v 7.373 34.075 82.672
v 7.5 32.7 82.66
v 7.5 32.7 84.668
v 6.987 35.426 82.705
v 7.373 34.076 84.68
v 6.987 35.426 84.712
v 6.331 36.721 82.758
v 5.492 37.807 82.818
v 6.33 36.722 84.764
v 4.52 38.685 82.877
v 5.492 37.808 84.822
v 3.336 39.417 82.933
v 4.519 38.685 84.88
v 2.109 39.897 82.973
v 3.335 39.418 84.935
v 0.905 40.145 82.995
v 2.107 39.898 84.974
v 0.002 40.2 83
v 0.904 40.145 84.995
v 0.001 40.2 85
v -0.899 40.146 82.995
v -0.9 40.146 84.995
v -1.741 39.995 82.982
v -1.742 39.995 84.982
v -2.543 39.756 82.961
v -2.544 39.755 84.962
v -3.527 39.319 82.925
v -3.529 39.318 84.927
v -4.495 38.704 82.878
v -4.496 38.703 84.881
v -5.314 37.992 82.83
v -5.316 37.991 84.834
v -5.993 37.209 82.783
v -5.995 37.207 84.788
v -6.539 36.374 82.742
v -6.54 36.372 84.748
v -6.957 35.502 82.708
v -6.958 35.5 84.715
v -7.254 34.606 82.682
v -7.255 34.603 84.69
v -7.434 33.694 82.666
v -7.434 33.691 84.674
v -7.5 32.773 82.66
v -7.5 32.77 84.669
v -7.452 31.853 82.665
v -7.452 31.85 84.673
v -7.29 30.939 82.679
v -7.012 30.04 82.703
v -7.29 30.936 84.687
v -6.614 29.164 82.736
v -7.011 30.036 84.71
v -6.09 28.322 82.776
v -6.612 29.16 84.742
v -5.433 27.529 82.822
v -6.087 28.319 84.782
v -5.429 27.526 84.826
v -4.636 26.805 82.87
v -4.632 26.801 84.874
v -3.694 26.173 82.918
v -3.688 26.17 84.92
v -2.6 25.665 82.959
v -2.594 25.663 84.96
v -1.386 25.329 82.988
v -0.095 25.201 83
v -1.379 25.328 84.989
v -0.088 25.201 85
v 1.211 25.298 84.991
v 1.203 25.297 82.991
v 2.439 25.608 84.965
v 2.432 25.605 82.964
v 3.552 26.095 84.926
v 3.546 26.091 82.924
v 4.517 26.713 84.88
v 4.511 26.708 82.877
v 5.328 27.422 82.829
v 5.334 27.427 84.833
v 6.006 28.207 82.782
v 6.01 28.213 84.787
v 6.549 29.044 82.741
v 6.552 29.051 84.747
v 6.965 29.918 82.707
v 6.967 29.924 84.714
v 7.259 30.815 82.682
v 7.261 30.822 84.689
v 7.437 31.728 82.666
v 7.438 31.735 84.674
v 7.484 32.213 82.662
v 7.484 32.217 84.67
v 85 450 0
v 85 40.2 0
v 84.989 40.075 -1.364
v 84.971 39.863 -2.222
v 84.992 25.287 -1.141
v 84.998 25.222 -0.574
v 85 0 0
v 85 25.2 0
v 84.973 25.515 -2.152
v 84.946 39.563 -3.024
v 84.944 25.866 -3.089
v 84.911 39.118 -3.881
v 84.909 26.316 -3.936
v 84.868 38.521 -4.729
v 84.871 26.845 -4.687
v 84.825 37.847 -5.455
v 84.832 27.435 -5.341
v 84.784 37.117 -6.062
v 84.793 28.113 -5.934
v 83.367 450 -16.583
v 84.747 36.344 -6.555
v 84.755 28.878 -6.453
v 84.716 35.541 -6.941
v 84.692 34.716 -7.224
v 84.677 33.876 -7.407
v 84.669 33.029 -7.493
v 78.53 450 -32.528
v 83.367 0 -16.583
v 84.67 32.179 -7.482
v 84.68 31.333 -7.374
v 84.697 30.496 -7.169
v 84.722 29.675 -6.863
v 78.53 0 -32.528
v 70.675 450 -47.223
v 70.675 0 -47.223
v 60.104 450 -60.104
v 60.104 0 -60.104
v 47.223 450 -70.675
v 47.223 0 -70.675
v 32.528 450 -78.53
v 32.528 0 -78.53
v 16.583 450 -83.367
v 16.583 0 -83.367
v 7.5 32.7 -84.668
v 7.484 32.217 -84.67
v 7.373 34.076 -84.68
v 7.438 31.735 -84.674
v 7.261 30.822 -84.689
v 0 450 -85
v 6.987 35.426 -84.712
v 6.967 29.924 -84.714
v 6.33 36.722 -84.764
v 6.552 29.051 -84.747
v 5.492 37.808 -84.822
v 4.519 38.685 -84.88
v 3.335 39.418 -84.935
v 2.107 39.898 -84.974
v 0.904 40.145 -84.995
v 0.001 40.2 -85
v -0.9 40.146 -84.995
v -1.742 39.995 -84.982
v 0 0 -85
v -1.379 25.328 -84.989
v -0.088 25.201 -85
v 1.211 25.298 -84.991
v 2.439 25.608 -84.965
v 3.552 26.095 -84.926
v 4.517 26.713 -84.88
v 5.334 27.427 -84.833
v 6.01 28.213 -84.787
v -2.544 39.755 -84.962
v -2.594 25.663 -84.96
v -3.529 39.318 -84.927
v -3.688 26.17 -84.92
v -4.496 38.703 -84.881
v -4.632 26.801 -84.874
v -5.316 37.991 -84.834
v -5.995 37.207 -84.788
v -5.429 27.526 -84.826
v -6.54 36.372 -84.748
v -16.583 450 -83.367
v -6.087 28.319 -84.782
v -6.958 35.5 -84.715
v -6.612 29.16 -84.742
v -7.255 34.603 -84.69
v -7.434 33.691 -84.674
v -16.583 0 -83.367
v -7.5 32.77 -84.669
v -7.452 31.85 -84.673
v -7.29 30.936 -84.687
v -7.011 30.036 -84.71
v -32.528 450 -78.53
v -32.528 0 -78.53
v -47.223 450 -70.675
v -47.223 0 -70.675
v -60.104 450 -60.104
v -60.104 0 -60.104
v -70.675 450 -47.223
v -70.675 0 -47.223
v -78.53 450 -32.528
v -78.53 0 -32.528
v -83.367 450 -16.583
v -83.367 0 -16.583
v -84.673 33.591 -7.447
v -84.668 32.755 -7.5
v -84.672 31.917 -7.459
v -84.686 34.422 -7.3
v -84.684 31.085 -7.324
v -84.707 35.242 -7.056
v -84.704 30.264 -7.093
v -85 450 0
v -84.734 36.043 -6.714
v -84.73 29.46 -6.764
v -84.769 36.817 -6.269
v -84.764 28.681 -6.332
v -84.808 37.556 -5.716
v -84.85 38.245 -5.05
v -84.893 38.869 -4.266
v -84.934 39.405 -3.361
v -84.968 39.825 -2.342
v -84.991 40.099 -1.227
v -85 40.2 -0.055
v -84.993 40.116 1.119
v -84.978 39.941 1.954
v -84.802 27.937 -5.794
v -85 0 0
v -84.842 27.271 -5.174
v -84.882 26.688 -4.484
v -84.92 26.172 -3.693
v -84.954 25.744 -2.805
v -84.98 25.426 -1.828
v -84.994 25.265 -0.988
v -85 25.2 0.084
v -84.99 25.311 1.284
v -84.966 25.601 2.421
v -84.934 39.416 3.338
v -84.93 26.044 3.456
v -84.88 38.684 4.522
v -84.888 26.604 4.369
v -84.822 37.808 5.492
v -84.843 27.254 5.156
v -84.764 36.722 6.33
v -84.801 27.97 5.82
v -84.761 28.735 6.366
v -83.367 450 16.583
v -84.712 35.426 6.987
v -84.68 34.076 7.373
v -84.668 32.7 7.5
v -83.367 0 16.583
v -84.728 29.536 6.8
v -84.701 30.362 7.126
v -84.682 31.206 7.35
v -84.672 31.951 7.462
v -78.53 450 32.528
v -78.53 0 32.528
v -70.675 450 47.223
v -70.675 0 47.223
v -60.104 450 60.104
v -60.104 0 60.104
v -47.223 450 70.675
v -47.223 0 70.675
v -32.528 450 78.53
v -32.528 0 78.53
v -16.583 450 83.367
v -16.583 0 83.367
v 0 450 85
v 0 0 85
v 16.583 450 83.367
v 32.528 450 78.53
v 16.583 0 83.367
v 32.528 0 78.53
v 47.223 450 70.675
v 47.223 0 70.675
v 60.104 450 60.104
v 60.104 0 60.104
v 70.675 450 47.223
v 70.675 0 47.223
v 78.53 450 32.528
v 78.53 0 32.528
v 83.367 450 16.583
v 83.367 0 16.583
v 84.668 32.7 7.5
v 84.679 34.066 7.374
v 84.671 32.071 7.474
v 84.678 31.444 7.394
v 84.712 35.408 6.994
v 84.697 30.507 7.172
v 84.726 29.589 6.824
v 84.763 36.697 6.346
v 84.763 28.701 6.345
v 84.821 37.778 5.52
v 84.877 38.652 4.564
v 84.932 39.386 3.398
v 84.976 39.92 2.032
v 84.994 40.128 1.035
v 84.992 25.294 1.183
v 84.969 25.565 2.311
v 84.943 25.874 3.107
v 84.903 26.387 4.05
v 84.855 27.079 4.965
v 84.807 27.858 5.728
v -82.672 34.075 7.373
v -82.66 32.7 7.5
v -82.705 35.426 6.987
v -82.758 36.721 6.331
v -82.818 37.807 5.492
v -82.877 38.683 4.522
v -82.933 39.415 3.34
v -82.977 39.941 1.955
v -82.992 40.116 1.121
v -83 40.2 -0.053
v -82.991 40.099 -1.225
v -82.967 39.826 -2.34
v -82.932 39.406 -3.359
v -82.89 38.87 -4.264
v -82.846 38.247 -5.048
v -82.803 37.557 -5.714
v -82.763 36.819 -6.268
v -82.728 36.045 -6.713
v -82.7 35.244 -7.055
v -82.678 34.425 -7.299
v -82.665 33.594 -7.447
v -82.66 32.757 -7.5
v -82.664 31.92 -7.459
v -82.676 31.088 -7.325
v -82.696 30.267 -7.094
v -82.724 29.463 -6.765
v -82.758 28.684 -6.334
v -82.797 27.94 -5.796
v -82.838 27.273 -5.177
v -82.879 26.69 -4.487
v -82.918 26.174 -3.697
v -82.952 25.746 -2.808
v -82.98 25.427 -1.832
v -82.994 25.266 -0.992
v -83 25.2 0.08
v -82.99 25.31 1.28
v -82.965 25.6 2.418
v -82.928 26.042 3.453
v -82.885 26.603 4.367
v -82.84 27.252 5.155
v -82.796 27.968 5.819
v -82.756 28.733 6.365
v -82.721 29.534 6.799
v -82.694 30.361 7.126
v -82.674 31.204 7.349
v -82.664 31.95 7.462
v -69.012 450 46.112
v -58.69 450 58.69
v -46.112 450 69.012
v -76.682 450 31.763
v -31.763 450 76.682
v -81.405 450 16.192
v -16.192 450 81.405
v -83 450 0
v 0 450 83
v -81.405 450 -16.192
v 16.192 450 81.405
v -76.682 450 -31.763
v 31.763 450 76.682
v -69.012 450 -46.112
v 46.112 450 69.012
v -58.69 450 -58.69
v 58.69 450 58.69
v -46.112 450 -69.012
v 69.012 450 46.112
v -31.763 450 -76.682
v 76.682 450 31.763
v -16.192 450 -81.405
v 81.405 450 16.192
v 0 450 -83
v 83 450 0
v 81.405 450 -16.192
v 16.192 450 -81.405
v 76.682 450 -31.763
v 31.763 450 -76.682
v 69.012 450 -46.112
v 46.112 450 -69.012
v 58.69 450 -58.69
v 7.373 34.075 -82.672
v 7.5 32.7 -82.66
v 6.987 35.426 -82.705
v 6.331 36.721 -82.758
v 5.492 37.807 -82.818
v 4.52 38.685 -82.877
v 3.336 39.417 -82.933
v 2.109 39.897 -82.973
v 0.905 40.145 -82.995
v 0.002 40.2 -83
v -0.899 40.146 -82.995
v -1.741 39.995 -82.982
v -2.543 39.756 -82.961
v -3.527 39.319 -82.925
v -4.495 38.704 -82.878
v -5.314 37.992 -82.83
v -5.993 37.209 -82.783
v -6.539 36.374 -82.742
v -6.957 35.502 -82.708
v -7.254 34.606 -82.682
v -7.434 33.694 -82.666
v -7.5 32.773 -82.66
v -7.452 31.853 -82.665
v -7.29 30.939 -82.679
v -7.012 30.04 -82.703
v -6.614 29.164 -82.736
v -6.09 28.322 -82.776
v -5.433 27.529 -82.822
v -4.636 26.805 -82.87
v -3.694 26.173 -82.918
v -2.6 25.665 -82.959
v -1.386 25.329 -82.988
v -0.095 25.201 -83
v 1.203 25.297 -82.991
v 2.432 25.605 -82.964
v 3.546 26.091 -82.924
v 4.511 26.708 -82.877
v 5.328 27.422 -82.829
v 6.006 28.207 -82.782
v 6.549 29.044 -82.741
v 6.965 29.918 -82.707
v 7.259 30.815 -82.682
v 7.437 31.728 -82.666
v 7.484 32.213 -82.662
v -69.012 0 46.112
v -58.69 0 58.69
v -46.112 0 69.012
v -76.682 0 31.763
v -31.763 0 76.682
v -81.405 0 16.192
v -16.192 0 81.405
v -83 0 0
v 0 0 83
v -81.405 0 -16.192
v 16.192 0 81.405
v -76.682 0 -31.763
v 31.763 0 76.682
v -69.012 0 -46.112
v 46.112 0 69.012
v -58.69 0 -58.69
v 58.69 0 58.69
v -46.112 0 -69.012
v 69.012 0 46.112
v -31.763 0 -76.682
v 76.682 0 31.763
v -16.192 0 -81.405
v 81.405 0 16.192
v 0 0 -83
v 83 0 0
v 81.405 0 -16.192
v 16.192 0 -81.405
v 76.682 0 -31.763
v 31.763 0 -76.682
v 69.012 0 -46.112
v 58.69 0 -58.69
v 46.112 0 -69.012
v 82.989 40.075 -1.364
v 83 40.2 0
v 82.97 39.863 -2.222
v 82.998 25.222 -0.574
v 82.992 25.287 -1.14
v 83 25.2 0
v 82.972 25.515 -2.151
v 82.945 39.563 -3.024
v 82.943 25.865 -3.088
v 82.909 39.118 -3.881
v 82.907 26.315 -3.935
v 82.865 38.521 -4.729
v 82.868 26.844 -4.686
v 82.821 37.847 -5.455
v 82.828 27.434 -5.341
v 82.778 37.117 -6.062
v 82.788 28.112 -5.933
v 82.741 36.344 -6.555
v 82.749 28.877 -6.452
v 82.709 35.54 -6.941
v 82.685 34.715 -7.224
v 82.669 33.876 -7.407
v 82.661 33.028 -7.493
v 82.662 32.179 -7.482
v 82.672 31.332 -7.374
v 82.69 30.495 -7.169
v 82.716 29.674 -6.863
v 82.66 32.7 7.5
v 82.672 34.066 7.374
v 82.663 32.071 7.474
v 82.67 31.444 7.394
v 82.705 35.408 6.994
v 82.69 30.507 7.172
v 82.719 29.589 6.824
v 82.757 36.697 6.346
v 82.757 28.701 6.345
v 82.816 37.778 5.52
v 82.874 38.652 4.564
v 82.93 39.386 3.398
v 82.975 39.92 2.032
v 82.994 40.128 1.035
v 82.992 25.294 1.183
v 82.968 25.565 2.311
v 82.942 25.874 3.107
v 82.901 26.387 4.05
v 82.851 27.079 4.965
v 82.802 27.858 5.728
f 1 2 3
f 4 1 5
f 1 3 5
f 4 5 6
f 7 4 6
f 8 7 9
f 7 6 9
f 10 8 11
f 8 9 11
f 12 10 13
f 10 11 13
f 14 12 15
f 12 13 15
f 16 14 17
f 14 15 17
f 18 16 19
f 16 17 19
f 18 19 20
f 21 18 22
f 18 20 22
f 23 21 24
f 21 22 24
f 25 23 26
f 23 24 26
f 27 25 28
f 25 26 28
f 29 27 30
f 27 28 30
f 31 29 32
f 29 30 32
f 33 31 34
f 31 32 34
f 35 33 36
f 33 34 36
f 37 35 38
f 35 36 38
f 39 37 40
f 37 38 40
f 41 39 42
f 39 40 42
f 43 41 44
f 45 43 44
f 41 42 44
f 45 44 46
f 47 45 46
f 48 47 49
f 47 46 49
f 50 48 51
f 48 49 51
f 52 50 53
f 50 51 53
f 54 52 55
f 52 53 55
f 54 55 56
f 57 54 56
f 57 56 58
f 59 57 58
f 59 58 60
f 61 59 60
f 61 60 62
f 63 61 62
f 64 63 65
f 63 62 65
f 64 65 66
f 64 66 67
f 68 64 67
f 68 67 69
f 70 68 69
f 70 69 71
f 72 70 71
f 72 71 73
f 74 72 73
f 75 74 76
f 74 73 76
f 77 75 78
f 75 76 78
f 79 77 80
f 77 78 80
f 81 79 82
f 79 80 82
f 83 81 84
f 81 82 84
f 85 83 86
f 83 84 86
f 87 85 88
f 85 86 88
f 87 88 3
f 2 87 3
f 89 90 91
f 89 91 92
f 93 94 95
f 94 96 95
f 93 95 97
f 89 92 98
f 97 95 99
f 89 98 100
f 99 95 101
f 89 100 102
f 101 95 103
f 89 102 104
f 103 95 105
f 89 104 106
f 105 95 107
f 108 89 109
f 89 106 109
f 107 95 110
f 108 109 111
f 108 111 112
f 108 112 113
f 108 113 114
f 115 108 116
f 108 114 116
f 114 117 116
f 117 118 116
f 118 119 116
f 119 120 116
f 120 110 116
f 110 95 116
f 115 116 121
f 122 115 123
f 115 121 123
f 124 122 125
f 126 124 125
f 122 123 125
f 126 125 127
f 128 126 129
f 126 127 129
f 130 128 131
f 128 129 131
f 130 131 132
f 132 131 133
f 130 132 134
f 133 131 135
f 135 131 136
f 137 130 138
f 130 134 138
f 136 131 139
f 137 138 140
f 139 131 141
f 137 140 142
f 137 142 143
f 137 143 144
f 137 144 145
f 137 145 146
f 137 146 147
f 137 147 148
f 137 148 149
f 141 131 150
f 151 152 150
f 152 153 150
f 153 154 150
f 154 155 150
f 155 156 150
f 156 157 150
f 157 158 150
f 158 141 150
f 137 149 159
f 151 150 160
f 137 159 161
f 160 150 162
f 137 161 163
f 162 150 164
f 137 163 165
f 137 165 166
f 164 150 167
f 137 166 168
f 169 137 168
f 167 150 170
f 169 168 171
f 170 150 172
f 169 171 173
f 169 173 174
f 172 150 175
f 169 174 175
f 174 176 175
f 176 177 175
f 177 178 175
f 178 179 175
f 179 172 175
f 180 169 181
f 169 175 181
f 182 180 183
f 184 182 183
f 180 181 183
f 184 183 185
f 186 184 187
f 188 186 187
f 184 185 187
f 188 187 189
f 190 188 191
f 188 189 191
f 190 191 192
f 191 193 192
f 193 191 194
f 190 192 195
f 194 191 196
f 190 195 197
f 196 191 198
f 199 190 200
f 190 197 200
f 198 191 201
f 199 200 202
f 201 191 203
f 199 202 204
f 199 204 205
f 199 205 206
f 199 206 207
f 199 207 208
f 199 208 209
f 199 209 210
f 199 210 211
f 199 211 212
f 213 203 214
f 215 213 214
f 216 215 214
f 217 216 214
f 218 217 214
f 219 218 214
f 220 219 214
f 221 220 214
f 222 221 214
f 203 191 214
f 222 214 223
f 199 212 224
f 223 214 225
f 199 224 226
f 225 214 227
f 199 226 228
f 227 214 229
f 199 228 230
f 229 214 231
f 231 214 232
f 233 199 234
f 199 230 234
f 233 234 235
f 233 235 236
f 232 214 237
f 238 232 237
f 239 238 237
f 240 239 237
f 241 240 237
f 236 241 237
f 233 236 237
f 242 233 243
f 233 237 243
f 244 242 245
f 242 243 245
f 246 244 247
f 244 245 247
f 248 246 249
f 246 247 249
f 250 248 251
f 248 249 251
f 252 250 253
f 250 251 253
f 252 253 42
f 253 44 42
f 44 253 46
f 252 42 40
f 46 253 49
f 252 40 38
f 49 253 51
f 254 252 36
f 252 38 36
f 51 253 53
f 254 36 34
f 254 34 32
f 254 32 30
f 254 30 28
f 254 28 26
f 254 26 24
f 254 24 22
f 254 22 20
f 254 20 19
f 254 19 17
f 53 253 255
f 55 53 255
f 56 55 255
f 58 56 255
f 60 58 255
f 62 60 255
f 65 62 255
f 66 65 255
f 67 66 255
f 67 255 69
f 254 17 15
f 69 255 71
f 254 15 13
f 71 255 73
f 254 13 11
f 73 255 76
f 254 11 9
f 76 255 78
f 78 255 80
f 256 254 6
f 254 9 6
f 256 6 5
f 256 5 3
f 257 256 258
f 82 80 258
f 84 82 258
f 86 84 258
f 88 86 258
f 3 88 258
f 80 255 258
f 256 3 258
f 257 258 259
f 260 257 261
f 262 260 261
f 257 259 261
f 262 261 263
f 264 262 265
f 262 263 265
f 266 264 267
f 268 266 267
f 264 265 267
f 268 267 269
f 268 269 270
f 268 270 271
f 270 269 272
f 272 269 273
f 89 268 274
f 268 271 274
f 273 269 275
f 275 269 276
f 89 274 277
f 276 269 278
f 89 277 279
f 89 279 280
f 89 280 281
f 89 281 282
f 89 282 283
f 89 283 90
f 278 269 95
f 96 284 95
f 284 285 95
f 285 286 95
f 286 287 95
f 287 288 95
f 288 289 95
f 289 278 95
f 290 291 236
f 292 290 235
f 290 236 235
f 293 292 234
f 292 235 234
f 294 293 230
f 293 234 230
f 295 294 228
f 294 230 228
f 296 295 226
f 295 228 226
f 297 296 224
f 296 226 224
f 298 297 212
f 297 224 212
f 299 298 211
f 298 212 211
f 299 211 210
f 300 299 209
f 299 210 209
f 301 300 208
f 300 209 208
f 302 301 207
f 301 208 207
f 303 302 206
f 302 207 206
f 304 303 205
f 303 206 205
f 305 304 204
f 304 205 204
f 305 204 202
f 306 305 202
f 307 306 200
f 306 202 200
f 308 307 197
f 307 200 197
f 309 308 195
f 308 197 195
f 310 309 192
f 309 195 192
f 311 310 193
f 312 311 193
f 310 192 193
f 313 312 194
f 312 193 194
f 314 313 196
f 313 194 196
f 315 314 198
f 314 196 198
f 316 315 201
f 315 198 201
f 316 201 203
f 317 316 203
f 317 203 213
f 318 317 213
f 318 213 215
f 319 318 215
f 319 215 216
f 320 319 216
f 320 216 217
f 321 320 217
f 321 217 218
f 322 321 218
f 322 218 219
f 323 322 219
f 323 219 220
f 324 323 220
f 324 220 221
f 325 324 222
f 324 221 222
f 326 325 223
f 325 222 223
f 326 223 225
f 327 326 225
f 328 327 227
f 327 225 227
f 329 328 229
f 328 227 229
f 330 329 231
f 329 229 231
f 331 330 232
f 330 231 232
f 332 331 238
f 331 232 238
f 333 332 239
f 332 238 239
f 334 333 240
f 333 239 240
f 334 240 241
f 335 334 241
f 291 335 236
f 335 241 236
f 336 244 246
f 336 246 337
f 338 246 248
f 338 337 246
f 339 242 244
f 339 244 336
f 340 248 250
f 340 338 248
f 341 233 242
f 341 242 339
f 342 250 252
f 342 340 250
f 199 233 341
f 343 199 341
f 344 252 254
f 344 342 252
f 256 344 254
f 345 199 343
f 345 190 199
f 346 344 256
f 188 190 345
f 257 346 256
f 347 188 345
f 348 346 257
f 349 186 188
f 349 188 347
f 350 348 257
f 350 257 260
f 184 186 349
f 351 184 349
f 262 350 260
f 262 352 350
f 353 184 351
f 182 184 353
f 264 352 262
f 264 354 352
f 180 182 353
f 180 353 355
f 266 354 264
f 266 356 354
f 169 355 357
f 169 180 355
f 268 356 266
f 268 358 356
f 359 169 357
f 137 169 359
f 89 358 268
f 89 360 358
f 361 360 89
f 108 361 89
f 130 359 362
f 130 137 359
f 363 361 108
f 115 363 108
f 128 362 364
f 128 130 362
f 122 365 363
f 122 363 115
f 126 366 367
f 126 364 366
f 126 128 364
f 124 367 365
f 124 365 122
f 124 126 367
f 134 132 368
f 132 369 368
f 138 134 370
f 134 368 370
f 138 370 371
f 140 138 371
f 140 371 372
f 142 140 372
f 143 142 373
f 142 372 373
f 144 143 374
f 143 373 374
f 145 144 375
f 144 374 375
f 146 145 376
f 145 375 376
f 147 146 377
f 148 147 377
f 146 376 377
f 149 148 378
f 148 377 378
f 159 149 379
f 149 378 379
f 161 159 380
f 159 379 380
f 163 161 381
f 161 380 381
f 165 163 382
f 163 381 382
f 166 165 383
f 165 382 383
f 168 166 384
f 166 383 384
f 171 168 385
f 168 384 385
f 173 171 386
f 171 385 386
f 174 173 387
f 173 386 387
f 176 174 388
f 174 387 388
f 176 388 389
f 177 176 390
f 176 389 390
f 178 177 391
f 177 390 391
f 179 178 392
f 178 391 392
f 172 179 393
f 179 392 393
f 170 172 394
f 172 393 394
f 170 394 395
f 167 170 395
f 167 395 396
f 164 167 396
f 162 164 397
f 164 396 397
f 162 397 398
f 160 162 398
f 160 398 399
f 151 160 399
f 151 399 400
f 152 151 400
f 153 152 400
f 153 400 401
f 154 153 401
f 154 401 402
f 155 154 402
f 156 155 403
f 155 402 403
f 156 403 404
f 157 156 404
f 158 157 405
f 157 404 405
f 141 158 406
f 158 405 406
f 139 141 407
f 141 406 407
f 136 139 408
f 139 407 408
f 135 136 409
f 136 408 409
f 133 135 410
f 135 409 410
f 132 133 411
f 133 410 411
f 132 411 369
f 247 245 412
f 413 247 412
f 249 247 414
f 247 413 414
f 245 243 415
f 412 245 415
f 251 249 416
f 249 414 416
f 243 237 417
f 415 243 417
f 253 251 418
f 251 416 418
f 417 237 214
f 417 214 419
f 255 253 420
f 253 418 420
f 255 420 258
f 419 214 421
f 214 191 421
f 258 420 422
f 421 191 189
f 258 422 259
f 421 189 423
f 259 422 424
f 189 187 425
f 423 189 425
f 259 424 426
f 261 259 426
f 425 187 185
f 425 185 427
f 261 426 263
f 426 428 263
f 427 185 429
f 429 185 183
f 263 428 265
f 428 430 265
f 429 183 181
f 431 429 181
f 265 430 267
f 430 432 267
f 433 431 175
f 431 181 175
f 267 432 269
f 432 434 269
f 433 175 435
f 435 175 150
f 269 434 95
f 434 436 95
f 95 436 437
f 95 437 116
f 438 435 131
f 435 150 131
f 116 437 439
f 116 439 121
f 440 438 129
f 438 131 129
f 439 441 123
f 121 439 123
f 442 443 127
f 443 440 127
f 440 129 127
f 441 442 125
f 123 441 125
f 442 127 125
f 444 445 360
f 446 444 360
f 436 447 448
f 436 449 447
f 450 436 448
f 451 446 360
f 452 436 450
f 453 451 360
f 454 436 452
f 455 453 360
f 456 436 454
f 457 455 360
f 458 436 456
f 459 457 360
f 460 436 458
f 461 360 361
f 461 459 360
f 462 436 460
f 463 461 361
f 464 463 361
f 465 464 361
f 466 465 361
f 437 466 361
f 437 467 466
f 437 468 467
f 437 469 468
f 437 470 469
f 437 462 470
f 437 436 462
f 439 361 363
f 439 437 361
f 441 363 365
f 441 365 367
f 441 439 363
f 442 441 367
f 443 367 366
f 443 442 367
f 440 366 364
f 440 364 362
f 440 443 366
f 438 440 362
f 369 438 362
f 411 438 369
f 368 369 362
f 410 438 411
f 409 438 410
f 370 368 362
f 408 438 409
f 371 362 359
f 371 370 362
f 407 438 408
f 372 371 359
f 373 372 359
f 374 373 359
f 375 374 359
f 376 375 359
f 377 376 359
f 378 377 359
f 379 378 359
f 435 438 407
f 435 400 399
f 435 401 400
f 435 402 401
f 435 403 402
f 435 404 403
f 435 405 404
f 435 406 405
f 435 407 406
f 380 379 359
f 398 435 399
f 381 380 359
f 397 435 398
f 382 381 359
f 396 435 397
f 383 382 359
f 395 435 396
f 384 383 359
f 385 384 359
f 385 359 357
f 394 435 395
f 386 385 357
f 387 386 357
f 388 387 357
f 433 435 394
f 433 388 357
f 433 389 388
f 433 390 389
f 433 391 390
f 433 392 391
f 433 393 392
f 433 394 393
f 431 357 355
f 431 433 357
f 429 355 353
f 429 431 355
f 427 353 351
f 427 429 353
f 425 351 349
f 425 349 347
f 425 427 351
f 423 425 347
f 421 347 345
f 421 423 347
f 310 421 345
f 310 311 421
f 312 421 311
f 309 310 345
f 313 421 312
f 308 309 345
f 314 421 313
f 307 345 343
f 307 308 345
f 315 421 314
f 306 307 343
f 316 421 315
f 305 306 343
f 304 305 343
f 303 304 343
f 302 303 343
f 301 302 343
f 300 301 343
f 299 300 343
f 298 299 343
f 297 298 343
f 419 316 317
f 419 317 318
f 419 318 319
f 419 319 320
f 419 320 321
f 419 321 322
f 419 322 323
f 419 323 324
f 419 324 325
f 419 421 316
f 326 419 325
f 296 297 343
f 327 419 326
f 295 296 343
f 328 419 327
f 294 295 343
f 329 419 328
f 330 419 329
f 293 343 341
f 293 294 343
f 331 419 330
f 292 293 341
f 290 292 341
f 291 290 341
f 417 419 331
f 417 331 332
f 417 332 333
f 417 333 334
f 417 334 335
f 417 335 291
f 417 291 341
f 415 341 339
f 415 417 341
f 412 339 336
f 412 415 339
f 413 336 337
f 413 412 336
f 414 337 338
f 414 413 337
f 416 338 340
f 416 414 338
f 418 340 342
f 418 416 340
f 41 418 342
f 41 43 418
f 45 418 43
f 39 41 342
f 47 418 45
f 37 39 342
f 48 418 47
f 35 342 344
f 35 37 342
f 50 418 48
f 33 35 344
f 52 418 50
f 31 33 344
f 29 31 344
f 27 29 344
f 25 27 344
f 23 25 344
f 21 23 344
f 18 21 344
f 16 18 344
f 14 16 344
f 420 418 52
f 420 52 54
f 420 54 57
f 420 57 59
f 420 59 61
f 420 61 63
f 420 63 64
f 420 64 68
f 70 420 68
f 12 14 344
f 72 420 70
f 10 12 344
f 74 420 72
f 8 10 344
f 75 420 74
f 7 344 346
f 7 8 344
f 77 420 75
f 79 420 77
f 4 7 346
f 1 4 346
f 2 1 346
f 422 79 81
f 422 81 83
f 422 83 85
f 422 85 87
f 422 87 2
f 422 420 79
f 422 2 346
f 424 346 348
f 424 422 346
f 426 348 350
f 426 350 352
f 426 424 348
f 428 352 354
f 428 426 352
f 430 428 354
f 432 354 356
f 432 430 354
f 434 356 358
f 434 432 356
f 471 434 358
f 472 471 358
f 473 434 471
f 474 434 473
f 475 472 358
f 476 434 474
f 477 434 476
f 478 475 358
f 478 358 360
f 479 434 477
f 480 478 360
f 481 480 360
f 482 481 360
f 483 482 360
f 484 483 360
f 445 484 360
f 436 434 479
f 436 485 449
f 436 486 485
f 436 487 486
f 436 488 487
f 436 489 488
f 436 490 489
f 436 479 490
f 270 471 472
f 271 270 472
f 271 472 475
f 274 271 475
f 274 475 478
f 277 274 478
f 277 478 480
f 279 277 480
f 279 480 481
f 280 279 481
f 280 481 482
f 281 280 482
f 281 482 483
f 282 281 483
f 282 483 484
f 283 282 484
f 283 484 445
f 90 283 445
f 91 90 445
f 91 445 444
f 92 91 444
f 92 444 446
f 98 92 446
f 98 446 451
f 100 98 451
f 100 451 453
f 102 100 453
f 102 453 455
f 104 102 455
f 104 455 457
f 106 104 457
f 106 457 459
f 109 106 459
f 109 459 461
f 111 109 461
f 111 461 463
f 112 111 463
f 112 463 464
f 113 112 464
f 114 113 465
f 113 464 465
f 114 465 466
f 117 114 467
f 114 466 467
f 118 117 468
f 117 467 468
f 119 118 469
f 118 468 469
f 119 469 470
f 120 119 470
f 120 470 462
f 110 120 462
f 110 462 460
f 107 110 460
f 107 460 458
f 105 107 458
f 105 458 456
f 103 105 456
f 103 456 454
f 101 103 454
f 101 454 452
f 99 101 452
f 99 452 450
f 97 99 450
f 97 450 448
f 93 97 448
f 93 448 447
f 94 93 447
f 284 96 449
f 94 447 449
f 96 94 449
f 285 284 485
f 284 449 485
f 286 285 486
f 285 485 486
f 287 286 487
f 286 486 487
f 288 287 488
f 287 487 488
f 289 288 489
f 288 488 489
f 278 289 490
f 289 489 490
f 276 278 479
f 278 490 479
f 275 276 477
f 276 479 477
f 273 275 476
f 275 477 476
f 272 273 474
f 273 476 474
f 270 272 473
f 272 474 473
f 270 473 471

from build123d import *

# Parameters (mm, degrees)
SKETCH1_R           = 85
SKETCH1_R_2         = 83
EXTRUDE_THIN1_DEPTH = 450
SKETCH2_R           = 7.5
CUT_EXTRUDE1_DEPTH  = 100
CIRPATTERN1_COUNT   = 2
CIRPATTERN1_ANGLE   = 90


with BuildPart() as part:
    # Sketch1 → Extrude-Thin1 (new body)
    with BuildSketch(Plane(origin=(0, 0, 0), x_dir=(1, 0, 0), z_dir=(0, 1, 0))):
        Circle(SKETCH1_R)
        Circle(SKETCH1_R_2, mode=Mode.SUBTRACT)
    extrude(amount=EXTRUDE_THIN1_DEPTH)

    # Sketch2 → Cut-Extrude1 (cut, symmetric)
    with BuildSketch(Plane.XY):
        with Locations((0, 32.7)):
            Circle(SKETCH2_R)
    cut_extrude1 = extrude(amount=CUT_EXTRUDE1_DEPTH, both=True, mode=Mode.SUBTRACT)

    # CirPattern1: Cut-Extrude1 ×2 about axis
    cirpattern1_axis = Axis((0, 450, 0), (0, -1, 0))
    for i in range(1, CIRPATTERN1_COUNT):
        add(cut_extrude1.rotate(cirpattern1_axis, i * CIRPATTERN1_ANGLE / (CIRPATTERN1_COUNT - 1)), mode=Mode.SUBTRACT)


solid = part.part
